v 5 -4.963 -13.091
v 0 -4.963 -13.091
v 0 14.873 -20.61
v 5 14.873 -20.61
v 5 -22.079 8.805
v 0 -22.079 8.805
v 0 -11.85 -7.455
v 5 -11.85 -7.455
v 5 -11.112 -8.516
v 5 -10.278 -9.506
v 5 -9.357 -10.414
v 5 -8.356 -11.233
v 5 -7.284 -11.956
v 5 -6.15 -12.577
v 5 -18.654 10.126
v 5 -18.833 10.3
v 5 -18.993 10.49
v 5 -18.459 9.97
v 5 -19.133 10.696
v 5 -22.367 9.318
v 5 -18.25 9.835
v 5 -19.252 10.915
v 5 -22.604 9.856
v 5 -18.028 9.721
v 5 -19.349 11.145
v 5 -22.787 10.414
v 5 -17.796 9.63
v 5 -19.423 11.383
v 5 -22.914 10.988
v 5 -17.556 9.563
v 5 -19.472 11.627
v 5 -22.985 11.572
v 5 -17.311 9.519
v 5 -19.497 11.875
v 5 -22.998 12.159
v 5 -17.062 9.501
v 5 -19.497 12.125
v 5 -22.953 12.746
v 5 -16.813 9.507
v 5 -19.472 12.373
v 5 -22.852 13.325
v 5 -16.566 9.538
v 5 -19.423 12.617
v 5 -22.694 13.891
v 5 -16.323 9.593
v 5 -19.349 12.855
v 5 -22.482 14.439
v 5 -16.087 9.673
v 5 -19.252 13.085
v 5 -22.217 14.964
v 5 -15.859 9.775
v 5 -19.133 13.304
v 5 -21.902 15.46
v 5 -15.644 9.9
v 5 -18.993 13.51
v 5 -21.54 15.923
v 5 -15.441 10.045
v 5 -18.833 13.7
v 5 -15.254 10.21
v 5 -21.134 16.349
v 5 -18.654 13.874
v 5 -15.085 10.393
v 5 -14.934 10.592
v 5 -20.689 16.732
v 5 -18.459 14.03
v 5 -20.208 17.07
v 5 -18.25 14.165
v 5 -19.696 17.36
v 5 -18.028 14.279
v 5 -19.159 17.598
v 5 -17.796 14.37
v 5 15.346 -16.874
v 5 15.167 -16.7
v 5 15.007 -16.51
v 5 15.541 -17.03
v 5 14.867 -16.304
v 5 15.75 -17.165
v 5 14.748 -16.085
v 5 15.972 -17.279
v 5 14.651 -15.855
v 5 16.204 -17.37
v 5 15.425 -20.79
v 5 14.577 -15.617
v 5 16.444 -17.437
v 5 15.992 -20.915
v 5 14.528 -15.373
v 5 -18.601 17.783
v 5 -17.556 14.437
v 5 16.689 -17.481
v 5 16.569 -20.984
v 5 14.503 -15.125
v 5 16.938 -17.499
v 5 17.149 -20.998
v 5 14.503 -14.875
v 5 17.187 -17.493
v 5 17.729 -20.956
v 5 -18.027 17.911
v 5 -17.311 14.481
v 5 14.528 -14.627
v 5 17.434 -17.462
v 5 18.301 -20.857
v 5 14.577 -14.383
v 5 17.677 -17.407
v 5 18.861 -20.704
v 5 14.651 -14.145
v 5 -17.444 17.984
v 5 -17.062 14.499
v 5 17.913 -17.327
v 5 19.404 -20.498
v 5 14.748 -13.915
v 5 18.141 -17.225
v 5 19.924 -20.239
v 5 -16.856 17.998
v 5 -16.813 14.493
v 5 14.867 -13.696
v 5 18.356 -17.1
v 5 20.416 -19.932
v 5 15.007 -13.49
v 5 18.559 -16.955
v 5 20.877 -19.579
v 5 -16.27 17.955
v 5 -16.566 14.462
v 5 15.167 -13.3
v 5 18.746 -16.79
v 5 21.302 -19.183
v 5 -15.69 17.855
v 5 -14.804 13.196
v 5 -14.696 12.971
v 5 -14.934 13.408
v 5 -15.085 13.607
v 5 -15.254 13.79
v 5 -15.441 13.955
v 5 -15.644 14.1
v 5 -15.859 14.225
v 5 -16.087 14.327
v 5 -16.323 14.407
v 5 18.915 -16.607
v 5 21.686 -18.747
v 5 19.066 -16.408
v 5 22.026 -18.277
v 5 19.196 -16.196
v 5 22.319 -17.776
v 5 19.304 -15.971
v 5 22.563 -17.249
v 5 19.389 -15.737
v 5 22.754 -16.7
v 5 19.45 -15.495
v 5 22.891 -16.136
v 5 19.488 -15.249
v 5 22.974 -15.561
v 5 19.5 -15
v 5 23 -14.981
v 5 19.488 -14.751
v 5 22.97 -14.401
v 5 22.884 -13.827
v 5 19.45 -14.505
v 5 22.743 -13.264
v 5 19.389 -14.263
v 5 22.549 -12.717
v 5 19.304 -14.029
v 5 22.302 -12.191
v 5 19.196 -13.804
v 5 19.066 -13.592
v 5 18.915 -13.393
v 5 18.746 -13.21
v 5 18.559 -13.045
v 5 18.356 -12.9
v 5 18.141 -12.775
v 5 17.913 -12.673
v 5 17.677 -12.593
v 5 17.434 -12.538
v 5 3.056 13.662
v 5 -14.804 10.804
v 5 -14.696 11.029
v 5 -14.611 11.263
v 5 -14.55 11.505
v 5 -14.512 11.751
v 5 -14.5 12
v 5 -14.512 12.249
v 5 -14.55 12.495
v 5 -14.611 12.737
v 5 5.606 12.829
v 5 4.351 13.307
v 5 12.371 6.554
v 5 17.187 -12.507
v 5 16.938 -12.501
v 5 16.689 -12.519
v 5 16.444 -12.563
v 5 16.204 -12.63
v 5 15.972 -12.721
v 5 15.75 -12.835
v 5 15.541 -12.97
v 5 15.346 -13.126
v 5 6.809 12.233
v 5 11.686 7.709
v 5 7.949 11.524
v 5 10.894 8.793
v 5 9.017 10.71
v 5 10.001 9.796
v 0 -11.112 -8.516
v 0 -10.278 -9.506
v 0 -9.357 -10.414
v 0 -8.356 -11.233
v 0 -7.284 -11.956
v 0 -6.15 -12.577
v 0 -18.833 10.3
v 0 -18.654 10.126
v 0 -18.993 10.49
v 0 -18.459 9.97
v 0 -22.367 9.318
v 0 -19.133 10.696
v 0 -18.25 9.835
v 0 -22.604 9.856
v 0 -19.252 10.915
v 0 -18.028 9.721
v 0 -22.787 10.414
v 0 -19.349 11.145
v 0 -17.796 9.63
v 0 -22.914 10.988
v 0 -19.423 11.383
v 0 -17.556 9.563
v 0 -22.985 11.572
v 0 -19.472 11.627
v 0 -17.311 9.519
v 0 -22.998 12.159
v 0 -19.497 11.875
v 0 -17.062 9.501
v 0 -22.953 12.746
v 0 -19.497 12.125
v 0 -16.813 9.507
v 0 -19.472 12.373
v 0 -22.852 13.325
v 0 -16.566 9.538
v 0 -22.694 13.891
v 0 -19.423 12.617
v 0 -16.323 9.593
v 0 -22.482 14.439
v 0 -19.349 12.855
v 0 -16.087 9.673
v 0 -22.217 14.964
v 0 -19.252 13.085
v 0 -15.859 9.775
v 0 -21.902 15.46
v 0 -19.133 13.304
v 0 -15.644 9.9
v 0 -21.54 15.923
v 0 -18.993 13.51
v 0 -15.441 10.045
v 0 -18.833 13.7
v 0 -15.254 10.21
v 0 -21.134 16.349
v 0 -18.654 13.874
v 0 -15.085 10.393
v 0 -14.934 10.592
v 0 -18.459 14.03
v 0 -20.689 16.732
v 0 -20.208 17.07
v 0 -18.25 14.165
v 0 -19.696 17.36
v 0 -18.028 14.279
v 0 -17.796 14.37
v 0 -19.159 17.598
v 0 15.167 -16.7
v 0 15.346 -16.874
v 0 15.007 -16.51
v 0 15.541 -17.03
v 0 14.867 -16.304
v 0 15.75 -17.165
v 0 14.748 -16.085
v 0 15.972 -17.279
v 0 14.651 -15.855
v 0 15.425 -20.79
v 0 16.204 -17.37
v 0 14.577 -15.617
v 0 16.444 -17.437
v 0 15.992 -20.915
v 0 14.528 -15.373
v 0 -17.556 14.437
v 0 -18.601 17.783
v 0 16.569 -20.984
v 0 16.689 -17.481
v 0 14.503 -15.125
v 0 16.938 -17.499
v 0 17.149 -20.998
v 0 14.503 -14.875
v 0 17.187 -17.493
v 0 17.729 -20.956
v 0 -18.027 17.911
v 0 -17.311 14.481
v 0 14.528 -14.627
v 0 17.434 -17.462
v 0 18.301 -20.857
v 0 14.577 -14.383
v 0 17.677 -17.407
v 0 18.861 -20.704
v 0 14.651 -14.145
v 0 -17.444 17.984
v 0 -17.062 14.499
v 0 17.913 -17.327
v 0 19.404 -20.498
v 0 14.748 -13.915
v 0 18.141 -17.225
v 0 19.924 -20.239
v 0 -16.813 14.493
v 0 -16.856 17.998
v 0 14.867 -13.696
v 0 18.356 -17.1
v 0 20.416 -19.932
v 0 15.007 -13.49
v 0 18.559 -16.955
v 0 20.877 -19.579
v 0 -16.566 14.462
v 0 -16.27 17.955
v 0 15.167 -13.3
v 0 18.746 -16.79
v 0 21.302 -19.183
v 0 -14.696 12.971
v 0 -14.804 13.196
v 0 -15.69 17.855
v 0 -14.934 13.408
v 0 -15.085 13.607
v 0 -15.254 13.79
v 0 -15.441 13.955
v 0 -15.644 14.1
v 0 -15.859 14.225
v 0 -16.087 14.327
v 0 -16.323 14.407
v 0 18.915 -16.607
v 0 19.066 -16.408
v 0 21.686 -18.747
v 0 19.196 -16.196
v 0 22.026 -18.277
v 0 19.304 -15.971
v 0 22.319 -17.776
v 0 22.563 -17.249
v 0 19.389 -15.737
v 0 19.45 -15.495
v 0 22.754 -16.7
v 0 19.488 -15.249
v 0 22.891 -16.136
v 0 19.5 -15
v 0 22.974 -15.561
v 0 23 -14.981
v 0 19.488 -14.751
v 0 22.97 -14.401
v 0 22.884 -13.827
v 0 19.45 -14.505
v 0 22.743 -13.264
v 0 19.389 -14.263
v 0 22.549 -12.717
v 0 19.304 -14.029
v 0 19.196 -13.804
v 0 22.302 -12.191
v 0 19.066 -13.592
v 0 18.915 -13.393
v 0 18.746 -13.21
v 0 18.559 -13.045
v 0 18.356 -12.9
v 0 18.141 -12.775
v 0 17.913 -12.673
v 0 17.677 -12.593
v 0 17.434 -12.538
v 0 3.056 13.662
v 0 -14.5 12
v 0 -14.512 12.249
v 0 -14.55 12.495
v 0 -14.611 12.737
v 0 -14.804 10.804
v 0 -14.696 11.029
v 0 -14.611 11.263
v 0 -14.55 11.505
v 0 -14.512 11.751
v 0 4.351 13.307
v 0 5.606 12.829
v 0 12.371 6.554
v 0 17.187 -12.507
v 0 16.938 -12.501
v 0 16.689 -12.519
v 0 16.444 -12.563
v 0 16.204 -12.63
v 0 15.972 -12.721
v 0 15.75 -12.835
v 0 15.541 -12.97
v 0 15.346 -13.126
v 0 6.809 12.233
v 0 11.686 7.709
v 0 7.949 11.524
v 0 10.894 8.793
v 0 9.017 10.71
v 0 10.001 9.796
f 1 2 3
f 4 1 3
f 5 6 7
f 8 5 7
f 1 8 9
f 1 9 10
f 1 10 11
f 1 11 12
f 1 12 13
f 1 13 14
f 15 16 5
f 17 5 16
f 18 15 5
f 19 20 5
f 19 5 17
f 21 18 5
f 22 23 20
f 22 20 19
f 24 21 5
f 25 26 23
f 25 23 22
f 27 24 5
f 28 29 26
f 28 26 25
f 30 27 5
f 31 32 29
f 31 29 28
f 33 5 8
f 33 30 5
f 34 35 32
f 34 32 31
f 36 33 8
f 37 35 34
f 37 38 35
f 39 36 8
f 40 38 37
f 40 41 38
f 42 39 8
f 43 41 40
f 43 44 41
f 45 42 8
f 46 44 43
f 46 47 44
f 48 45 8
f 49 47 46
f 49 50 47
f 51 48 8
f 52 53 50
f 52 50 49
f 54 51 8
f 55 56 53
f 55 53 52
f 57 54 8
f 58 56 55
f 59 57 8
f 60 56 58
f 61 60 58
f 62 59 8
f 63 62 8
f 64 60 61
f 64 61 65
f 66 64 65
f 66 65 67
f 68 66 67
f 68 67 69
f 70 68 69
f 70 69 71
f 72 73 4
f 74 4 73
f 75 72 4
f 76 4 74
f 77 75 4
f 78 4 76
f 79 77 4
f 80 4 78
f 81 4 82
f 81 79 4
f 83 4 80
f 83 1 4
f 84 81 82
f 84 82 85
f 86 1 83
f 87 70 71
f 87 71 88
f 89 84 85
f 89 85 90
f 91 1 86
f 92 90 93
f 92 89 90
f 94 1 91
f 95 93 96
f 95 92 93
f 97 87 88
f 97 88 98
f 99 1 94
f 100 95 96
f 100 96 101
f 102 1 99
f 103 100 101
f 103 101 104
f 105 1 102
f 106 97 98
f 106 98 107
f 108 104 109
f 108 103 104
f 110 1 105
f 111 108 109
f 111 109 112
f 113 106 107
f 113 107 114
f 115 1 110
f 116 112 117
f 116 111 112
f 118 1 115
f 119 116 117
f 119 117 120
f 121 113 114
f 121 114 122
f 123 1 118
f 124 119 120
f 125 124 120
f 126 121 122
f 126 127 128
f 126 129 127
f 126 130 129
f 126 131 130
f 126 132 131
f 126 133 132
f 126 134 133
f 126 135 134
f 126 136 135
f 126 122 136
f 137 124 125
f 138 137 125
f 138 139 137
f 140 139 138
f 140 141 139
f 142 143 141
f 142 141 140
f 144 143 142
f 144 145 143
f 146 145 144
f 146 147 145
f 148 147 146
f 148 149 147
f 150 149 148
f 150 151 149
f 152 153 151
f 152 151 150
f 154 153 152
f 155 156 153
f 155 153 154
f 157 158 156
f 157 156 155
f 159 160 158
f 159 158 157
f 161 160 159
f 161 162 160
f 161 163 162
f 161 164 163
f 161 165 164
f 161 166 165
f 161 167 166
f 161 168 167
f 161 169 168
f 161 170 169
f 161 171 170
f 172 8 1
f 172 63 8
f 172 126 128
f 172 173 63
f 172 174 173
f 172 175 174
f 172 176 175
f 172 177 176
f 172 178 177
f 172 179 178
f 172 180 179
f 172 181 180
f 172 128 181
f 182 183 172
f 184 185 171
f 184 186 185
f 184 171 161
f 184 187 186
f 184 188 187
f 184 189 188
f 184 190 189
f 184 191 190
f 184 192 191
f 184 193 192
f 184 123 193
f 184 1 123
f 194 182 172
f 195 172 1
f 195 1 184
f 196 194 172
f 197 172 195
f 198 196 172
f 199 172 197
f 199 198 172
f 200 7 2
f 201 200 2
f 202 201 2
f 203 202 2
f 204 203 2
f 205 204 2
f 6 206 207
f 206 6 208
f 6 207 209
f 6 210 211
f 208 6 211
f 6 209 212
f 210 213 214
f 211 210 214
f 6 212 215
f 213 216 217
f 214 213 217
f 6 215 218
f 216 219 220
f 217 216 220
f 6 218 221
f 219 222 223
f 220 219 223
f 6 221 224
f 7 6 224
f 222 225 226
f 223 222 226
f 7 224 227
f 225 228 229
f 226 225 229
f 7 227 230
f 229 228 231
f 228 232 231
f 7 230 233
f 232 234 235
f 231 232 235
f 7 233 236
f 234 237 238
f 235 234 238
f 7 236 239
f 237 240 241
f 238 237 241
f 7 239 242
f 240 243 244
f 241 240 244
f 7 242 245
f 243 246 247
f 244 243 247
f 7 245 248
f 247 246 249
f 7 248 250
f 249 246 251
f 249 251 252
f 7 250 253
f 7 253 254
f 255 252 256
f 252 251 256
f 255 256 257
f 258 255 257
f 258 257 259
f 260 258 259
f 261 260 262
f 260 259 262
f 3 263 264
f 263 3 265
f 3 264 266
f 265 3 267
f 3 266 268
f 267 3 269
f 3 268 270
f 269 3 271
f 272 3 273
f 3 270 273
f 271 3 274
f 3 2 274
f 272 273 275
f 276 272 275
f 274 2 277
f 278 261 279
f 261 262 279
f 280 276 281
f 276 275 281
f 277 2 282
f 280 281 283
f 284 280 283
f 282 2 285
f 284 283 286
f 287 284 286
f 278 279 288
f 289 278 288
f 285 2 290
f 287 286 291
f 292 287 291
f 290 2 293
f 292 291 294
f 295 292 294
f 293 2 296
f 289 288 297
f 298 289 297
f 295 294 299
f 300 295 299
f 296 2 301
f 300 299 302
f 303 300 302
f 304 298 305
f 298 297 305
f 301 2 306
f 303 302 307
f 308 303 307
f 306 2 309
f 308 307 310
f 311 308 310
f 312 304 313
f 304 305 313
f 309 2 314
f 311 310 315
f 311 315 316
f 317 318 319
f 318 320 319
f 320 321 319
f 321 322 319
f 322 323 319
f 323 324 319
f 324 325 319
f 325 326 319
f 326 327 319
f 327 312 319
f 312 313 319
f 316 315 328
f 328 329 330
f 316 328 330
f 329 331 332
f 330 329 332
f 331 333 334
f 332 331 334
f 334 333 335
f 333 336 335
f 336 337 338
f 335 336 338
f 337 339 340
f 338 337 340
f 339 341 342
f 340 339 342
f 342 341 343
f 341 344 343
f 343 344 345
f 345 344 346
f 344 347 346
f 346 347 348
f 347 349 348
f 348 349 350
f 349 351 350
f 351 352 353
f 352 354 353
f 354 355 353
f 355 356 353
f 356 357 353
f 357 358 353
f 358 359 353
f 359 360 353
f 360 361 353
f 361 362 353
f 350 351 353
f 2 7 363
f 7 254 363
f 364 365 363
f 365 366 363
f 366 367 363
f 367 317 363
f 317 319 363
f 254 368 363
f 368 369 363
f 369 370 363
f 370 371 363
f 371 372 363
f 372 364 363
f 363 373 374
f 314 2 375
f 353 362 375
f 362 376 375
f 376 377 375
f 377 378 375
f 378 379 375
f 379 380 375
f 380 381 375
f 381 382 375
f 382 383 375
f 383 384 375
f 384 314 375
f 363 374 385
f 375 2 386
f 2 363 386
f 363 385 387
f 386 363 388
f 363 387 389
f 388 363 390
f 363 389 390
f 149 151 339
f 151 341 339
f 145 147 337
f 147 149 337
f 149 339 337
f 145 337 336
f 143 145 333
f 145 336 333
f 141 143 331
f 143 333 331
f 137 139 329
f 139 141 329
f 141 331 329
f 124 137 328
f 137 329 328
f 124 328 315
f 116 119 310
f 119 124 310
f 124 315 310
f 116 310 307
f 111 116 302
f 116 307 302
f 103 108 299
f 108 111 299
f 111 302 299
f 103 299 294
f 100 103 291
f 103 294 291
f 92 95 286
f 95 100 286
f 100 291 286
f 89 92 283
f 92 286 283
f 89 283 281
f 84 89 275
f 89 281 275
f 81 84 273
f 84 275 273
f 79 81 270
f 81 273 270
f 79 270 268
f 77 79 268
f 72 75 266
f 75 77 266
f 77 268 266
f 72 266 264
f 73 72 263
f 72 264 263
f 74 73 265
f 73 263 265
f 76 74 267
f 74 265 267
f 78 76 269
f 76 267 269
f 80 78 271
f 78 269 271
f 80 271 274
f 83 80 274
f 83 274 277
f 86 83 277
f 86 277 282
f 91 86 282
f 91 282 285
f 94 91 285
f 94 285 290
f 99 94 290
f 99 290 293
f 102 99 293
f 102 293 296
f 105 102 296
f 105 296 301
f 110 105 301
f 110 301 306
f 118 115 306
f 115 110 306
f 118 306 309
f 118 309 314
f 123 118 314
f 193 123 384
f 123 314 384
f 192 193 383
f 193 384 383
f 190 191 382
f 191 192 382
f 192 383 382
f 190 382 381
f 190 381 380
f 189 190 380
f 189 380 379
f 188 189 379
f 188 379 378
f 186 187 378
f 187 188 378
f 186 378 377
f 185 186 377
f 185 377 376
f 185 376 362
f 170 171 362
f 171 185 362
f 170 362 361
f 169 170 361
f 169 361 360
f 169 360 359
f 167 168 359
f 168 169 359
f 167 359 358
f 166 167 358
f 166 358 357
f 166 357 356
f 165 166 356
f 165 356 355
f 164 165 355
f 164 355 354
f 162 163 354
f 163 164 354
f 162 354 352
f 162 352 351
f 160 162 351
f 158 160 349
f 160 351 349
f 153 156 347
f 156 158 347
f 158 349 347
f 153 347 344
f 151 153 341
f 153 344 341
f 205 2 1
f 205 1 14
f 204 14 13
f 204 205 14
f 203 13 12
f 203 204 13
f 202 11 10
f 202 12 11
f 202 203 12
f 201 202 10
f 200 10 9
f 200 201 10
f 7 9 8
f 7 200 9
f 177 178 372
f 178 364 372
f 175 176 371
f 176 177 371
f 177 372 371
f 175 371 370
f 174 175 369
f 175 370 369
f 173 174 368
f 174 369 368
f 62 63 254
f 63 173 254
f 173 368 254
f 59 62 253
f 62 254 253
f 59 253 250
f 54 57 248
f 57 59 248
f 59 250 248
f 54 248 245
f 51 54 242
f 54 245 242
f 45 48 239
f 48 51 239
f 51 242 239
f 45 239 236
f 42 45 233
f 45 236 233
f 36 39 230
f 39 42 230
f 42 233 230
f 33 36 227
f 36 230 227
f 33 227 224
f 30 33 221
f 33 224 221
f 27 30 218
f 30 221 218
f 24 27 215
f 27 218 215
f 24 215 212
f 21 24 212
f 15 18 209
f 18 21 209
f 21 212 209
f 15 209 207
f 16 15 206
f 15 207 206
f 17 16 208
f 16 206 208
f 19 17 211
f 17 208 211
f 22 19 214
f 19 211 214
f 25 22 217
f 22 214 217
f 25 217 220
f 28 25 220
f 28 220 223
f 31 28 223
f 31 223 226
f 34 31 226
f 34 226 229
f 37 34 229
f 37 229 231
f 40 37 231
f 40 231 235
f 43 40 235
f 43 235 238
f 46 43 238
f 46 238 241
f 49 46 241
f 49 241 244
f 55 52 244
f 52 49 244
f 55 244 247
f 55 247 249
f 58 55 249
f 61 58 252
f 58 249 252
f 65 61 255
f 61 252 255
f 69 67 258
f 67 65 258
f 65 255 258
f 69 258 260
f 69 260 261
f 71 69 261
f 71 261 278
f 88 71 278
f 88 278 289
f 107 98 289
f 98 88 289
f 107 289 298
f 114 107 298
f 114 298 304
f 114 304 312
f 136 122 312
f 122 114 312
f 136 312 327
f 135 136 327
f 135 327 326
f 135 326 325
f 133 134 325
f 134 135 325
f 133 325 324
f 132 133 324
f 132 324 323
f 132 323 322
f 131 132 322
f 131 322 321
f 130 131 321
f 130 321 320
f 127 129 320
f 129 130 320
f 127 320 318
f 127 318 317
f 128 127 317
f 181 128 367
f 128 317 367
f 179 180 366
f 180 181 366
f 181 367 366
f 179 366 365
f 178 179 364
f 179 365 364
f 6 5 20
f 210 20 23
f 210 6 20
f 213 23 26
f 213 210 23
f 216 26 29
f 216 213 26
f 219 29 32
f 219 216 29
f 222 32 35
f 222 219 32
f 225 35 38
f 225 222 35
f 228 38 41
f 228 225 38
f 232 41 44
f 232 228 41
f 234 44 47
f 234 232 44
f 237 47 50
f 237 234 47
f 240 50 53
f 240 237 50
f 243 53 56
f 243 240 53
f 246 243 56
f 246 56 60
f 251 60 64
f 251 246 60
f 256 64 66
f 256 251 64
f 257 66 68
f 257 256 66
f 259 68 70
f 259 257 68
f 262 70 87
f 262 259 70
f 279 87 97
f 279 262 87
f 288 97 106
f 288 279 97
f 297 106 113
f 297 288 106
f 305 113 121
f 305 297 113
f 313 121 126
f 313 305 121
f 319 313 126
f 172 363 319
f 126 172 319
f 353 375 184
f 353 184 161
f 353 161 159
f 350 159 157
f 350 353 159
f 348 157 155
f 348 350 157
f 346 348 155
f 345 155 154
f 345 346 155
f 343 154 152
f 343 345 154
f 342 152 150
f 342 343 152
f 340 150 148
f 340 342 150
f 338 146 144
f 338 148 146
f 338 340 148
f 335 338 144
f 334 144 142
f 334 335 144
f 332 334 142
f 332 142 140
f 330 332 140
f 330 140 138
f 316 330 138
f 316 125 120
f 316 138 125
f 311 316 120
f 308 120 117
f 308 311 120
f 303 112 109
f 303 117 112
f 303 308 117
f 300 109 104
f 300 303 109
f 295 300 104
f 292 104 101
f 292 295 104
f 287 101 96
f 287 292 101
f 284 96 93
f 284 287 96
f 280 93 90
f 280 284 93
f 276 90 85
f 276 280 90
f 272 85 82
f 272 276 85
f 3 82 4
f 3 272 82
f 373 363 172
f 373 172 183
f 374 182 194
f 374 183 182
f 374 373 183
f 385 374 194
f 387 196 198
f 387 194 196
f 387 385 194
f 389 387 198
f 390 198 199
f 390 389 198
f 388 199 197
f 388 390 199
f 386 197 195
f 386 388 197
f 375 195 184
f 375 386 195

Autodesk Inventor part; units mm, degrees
ref_plane "YZ Plane" through (0, 0, 0) normal (1, 0, 0) x (0, 1, 0)
ref_plane "XZ Plane" through (0, 0, 0) normal (0, 1, 0) x (-1, 0, 0)
ref_plane "XY Plane" through (0, 0, 0) normal (0, 0, 1) x (1, 0, 0)
sketch "Sketch3" plane through (0, 0, 0) normal (1, 0, 0) x (0, 1, 0)
  circle A0 centre (0, 0) radius 14
  line L0 (-23, -102.8316) -> (23, -102.8316)
  line L1 (23, -102.8316) -> (23, 102.8316)
  line L2 (23, 102.8316) -> (-23, 102.8316)
  line L3 (-23, 102.8316) -> (-23, -102.8316)
  line L4 (-23, -102.8316) -> (23, 102.8316) construction
  line L5 (23, -102.8316) -> (-23, 102.8316) construction
  circle A1 centre (17, -15) radius 2.5
  circle A2 centre (-17, 12) radius 2.5
  circle A3 centre (17, -15) radius 6
  circle A4 centre (-17, 12) radius 6
  line L6 (-22.0787, 8.8052) -> (-11.8503, -7.4546)
  line L7 (-4.9626, -13.0909) -> (14.8732, -20.6104)
  line L8 (12.3712, 6.554) -> (22.3019, -12.1912)
  line L9 (3.0558, 13.6624) -> (-15.6904, 17.8553)
  dimension "d11" = 28
  dimension "d12" = 46
  dimension "d13" = 5
  dimension "d14" = 6
  dimension "d15" = 6
  dimension "d16" = 12
  dimension "d17" = 15
extrude "Extrusion3" add sketch "Sketch3" along normal blind 5 contours A0 | A0 L8 A3 L7 | A0 L6 A4 L9 | A3 | A4
properties part number "frame_center"
